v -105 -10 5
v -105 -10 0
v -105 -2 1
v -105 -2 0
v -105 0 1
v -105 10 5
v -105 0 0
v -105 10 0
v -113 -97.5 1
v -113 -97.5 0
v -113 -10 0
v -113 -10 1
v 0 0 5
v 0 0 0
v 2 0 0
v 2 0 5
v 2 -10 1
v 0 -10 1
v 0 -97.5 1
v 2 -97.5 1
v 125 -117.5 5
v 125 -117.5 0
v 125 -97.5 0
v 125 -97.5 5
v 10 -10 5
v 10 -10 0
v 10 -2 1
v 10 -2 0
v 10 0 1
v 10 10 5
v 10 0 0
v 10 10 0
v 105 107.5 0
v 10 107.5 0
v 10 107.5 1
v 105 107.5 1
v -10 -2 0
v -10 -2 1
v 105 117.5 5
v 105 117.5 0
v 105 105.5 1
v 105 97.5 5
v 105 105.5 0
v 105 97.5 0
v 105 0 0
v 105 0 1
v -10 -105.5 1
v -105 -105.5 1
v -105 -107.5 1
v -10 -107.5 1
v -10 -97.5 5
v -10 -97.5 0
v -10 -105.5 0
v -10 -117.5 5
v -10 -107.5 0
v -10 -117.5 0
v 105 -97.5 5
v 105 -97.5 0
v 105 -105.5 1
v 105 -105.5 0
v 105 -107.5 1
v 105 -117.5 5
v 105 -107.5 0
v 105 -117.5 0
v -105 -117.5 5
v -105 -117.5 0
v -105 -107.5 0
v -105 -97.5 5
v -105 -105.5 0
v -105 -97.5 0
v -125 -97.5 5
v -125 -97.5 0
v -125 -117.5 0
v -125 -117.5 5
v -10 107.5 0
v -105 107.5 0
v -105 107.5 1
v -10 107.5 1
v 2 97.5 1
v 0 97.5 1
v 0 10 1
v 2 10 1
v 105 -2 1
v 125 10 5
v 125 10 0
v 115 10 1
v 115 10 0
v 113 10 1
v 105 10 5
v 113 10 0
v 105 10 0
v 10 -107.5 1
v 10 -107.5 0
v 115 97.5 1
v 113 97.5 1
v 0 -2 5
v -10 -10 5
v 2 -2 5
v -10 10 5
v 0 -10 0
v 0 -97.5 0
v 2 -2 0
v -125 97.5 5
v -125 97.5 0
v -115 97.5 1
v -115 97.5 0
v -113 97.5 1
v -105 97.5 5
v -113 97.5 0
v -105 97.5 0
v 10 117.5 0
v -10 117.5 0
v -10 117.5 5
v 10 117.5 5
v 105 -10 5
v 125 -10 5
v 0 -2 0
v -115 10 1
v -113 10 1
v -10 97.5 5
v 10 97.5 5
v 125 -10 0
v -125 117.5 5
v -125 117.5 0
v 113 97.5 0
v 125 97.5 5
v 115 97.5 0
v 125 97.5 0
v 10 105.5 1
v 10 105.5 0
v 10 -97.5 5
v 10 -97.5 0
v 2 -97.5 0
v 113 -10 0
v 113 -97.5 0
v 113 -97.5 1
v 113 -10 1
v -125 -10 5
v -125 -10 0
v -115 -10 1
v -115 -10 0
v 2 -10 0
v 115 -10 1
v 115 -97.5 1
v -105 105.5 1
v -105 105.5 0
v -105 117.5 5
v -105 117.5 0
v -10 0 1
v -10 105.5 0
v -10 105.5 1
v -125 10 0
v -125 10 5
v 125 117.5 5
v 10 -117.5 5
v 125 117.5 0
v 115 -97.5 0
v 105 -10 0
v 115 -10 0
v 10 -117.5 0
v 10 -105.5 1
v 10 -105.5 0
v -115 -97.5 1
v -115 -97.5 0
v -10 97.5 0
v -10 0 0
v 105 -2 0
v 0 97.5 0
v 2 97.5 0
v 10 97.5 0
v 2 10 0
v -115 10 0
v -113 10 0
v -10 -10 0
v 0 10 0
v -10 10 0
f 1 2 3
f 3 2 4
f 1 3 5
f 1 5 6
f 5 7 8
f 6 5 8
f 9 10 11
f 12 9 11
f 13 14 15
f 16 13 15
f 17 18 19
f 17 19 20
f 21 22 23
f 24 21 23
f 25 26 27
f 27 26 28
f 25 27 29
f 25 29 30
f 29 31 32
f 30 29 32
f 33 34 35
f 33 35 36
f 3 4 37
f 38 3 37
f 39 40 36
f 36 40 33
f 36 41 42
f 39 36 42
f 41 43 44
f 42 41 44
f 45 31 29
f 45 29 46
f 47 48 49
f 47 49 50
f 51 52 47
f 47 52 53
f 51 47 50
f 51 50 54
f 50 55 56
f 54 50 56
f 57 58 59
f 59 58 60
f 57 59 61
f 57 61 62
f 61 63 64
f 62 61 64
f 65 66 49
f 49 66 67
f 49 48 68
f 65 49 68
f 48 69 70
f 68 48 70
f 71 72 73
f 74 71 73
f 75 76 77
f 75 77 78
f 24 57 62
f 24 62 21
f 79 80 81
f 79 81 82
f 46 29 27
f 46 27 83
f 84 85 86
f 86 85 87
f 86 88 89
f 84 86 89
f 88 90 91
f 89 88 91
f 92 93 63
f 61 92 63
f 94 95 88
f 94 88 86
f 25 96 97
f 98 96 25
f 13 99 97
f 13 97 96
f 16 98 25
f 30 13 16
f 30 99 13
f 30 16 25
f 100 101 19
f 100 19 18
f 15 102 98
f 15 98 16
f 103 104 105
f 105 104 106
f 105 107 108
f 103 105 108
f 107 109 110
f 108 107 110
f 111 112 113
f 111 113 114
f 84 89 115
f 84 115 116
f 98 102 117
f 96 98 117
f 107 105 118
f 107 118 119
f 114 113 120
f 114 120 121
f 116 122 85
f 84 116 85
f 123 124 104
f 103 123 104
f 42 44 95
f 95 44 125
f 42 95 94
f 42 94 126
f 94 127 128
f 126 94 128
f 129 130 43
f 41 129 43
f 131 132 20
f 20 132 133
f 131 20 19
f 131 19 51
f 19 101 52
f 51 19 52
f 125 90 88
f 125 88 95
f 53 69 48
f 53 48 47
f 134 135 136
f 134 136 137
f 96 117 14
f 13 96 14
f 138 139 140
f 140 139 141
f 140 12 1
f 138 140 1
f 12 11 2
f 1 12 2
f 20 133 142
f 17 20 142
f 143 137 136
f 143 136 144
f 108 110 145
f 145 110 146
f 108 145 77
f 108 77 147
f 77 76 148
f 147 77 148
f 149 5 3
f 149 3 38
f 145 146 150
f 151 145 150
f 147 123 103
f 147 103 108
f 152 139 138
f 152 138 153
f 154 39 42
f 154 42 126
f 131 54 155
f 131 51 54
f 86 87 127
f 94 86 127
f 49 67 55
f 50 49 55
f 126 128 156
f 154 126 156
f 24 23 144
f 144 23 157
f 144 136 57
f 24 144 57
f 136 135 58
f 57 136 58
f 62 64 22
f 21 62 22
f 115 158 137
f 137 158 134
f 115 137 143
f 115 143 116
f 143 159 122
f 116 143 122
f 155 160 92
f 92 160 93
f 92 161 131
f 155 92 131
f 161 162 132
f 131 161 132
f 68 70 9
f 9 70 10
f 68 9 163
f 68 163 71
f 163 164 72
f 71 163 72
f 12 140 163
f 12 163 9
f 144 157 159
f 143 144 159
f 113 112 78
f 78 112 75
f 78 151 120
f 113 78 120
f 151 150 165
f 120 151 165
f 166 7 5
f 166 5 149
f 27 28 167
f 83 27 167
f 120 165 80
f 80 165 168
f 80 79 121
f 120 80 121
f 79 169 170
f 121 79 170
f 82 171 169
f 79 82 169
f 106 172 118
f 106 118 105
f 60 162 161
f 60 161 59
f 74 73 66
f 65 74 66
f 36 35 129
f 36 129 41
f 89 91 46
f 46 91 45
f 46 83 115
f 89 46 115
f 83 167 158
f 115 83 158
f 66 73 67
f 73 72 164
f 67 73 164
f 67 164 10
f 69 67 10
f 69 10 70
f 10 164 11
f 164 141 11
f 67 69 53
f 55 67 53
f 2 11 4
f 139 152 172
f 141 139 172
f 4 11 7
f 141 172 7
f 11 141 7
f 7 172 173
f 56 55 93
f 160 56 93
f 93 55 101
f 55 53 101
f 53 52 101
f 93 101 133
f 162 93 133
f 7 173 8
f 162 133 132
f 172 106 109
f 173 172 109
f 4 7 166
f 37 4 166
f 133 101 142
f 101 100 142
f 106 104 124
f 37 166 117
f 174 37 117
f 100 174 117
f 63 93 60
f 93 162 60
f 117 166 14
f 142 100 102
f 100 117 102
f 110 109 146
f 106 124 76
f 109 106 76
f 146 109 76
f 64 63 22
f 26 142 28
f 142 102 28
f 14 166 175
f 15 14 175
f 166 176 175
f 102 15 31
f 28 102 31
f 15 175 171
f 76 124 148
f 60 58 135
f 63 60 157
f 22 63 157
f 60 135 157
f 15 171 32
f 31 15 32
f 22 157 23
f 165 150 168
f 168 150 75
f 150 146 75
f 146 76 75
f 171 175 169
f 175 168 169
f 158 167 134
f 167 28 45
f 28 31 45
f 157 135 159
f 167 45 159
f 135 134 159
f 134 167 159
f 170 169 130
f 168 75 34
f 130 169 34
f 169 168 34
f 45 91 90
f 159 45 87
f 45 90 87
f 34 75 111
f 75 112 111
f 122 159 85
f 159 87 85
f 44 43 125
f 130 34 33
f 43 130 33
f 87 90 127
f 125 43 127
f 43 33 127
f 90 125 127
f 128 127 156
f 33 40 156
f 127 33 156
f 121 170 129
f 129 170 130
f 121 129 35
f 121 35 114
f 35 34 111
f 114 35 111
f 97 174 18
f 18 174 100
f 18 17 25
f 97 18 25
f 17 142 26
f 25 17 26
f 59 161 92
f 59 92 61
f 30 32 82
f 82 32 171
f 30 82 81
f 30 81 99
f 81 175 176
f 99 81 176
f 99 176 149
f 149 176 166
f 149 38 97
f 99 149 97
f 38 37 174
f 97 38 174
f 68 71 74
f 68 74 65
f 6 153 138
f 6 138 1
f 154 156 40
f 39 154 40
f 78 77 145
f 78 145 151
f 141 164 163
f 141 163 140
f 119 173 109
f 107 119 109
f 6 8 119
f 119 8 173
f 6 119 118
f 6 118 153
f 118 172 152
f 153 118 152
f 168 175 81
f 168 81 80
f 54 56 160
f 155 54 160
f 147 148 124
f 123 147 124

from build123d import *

# Parameters (mm, degrees)
F2_W     = 8
F2_H     = 8
F3_DEPTH = 5
F2_W_2   = 20
F2_H_2   = 10
F2_H_3   = 2
F2_W_3   = 10
F2_H_4   = 20
F2_W_4   = 2
F2_W_5   = 95
F2_H_5   = 87.5
F4_DEPTH = 1


with BuildPart() as f3:
    # F2 (on Top) → F3 (new body)
    with BuildSketch(Plane.XY):
        Polygon((-105, 117.5), (-125, 117.5), (-125, 97.5), (-115, 97.5), (-115, 107.5), (-105, 107.5), align=None)
        Polygon((-105, 105.5), (-105, 107.5), (-115, 107.5), (-115, 97.5), (-113, 97.5), (-113, 105.5), align=None)
        with Locations((-109, 101.5)):
            Rectangle(F2_W, F2_H)
    extrude(amount=F3_DEPTH)



with BuildPart() as f3b:
    # F2 (on Top) → F3, piece 2 (new body)
    with BuildSketch(Plane.XY):
        with Locations((0, 112.5)):
            Rectangle(F2_W_2, F2_H_2)
        with Locations((0, 106.5)):
            Rectangle(F2_W_2, F2_H_3)
        Polygon((10, 105.5), (-10, 105.5), (-10, 97.5), (0, 97.5), (2, 97.5), (10, 97.5), align=None)
    extrude(amount=F3_DEPTH)


with BuildPart() as f3c:
    # F2 (on Top) → F3, piece 3 (new body)
    with BuildSketch(Plane.XY):
        Polygon((105, 117.5), (105, 107.5), (115, 107.5), (115, 97.5), (125, 97.5), (125, 117.5), align=None)
        Polygon((115, 107.5), (105, 107.5), (105, 105.5), (113, 105.5), (113, 97.5), (115, 97.5), align=None)
        with Locations((109, 101.5)):
            Rectangle(F2_W, F2_H)
    extrude(amount=F3_DEPTH)


with BuildPart() as f3d:
    # F2 (on Top) → F3, piece 4 (new body)
    with BuildSketch(Plane.XY):
        with Locations((-120, 0)):
            Rectangle(F2_W_3, F2_H_4)
        with Locations((-114, 0)):
            Rectangle(F2_W_4, F2_H_4)
        Polygon((-105, 10), (-113, 10), (-113, -10), (-105, -10), (-105, -2), (-105, 0), align=None)
    extrude(amount=F3_DEPTH)


with BuildPart() as f3e:
    # F2 (on Top) → F3, piece 5 (new body)
    with BuildSketch(Plane.XY):
        with Locations((-5, -6)):
            Rectangle(F2_W_3, F2_H)
        with Locations((-5, -1)):
            Rectangle(F2_W_3, F2_H_3)
        with Locations((-5, 5)):
            Rectangle(F2_W_3, F2_H_2)
        with Locations((6, 5)):
            Rectangle(F2_W, F2_H_2)
        with Locations((1, 5)):
            Rectangle(F2_W_4, F2_H_2)
        with Locations((1, -6)):
            Rectangle(F2_W_4, F2_H)
        with Locations((6, -6)):
            Rectangle(F2_W, F2_H)
        with Locations((6, -1)):
            Rectangle(F2_W, F2_H_3)
    extrude(amount=F3_DEPTH)


with BuildPart() as f3f:
    # F2 (on Top) → F3, piece 6 (new body)
    with BuildSketch(Plane.XY):
        Polygon((113, -10), (113, 10), (105, 10), (105, 0), (105, -2), (105, -10), align=None)
        with Locations((114, 0)):
            Rectangle(F2_W_4, F2_H_4)
        with Locations((120, 0)):
            Rectangle(F2_W_3, F2_H_4)
    extrude(amount=F3_DEPTH)


with BuildPart() as f3g:
    # F2 (on Top) → F3, piece 7 (new body)
    with BuildSketch(Plane.XY):
        Polygon((-115, -107.5), (-115, -97.5), (-125, -97.5), (-125, -117.5), (-105, -117.5), (-105, -107.5), align=None)
        Polygon((-113, -97.5), (-115, -97.5), (-115, -107.5), (-105, -107.5), (-105, -105.5), (-113, -105.5), align=None)
        with Locations((-109, -101.5)):
            Rectangle(F2_W, F2_H)
    extrude(amount=F3_DEPTH)


with BuildPart() as f3h:
    # F2 (on Top) → F3, piece 8 (new body)
    with BuildSketch(Plane.XY):
        with Locations((0, -112.5)):
            Rectangle(F2_W_2, F2_H_2)
        with Locations((0, -106.5)):
            Rectangle(F2_W_2, F2_H_3)
        Polygon((-10, -97.5), (-10, -105.5), (10, -105.5), (10, -97.5), (2, -97.5), (0, -97.5), align=None)
    extrude(amount=F3_DEPTH)


with BuildPart() as f3i:
    # F2 (on Top) → F3, piece 9 (new body)
    with BuildSketch(Plane.XY):
        Polygon((125, -97.5), (115, -97.5), (115, -107.5), (105, -107.5), (105, -117.5), (125, -117.5), align=None)
        Polygon((115, -107.5), (115, -97.5), (113, -97.5), (113, -105.5), (105, -105.5), (105, -107.5), align=None)
        with Locations((109, -101.5)):
            Rectangle(F2_W, F2_H)
    extrude(amount=F3_DEPTH)


with BuildPart() as f3_1:
    add(f3.part)

    add(f3b.part)  # F4 merges F3b

    add(f3c.part)  # F4 merges F3c

    add(f3d.part)  # F4 merges F3d

    add(f3e.part)  # F4 merges F3e

    add(f3f.part)  # F4 merges F3f

    add(f3g.part)  # F4 merges F3g

    add(f3h.part)  # F4 merges F3h

    add(f3i.part)  # F4 merges F3i
    # F2 (on Top) → F4 (join)
    with BuildSketch(Plane.XY):
        with Locations((-57.5, 106.5)):
            Rectangle(F2_W_5, F2_H_3)
        with Locations((57.5, 106.5)):
            Rectangle(F2_W_5, F2_H_3)
        with Locations((114, 53.75)):
            Rectangle(F2_W_4, F2_H_5)
        with Locations((114, -53.75)):
            Rectangle(F2_W_4, F2_H_5)
        with Locations((57.5, -106.5)):
            Rectangle(F2_W_5, F2_H_3)
        with Locations((-57.5, -106.5)):
            Rectangle(F2_W_5, F2_H_3)
        with Locations((-114, -53.75)):
            Rectangle(F2_W_4, F2_H_5)
        with Locations((-114, 53.75)):
            Rectangle(F2_W_4, F2_H_5)
        with Locations((1, 53.75)):
            Rectangle(F2_W_4, F2_H_5)
        with Locations((1, -53.75)):
            Rectangle(F2_W_4, F2_H_5)
        with Locations((-57.5, -1)):
            Rectangle(F2_W_5, F2_H_3)
        with Locations((57.5, -1)):
            Rectangle(F2_W_5, F2_H_3)
    extrude(amount=F4_DEPTH)


solid = f3_1.part
